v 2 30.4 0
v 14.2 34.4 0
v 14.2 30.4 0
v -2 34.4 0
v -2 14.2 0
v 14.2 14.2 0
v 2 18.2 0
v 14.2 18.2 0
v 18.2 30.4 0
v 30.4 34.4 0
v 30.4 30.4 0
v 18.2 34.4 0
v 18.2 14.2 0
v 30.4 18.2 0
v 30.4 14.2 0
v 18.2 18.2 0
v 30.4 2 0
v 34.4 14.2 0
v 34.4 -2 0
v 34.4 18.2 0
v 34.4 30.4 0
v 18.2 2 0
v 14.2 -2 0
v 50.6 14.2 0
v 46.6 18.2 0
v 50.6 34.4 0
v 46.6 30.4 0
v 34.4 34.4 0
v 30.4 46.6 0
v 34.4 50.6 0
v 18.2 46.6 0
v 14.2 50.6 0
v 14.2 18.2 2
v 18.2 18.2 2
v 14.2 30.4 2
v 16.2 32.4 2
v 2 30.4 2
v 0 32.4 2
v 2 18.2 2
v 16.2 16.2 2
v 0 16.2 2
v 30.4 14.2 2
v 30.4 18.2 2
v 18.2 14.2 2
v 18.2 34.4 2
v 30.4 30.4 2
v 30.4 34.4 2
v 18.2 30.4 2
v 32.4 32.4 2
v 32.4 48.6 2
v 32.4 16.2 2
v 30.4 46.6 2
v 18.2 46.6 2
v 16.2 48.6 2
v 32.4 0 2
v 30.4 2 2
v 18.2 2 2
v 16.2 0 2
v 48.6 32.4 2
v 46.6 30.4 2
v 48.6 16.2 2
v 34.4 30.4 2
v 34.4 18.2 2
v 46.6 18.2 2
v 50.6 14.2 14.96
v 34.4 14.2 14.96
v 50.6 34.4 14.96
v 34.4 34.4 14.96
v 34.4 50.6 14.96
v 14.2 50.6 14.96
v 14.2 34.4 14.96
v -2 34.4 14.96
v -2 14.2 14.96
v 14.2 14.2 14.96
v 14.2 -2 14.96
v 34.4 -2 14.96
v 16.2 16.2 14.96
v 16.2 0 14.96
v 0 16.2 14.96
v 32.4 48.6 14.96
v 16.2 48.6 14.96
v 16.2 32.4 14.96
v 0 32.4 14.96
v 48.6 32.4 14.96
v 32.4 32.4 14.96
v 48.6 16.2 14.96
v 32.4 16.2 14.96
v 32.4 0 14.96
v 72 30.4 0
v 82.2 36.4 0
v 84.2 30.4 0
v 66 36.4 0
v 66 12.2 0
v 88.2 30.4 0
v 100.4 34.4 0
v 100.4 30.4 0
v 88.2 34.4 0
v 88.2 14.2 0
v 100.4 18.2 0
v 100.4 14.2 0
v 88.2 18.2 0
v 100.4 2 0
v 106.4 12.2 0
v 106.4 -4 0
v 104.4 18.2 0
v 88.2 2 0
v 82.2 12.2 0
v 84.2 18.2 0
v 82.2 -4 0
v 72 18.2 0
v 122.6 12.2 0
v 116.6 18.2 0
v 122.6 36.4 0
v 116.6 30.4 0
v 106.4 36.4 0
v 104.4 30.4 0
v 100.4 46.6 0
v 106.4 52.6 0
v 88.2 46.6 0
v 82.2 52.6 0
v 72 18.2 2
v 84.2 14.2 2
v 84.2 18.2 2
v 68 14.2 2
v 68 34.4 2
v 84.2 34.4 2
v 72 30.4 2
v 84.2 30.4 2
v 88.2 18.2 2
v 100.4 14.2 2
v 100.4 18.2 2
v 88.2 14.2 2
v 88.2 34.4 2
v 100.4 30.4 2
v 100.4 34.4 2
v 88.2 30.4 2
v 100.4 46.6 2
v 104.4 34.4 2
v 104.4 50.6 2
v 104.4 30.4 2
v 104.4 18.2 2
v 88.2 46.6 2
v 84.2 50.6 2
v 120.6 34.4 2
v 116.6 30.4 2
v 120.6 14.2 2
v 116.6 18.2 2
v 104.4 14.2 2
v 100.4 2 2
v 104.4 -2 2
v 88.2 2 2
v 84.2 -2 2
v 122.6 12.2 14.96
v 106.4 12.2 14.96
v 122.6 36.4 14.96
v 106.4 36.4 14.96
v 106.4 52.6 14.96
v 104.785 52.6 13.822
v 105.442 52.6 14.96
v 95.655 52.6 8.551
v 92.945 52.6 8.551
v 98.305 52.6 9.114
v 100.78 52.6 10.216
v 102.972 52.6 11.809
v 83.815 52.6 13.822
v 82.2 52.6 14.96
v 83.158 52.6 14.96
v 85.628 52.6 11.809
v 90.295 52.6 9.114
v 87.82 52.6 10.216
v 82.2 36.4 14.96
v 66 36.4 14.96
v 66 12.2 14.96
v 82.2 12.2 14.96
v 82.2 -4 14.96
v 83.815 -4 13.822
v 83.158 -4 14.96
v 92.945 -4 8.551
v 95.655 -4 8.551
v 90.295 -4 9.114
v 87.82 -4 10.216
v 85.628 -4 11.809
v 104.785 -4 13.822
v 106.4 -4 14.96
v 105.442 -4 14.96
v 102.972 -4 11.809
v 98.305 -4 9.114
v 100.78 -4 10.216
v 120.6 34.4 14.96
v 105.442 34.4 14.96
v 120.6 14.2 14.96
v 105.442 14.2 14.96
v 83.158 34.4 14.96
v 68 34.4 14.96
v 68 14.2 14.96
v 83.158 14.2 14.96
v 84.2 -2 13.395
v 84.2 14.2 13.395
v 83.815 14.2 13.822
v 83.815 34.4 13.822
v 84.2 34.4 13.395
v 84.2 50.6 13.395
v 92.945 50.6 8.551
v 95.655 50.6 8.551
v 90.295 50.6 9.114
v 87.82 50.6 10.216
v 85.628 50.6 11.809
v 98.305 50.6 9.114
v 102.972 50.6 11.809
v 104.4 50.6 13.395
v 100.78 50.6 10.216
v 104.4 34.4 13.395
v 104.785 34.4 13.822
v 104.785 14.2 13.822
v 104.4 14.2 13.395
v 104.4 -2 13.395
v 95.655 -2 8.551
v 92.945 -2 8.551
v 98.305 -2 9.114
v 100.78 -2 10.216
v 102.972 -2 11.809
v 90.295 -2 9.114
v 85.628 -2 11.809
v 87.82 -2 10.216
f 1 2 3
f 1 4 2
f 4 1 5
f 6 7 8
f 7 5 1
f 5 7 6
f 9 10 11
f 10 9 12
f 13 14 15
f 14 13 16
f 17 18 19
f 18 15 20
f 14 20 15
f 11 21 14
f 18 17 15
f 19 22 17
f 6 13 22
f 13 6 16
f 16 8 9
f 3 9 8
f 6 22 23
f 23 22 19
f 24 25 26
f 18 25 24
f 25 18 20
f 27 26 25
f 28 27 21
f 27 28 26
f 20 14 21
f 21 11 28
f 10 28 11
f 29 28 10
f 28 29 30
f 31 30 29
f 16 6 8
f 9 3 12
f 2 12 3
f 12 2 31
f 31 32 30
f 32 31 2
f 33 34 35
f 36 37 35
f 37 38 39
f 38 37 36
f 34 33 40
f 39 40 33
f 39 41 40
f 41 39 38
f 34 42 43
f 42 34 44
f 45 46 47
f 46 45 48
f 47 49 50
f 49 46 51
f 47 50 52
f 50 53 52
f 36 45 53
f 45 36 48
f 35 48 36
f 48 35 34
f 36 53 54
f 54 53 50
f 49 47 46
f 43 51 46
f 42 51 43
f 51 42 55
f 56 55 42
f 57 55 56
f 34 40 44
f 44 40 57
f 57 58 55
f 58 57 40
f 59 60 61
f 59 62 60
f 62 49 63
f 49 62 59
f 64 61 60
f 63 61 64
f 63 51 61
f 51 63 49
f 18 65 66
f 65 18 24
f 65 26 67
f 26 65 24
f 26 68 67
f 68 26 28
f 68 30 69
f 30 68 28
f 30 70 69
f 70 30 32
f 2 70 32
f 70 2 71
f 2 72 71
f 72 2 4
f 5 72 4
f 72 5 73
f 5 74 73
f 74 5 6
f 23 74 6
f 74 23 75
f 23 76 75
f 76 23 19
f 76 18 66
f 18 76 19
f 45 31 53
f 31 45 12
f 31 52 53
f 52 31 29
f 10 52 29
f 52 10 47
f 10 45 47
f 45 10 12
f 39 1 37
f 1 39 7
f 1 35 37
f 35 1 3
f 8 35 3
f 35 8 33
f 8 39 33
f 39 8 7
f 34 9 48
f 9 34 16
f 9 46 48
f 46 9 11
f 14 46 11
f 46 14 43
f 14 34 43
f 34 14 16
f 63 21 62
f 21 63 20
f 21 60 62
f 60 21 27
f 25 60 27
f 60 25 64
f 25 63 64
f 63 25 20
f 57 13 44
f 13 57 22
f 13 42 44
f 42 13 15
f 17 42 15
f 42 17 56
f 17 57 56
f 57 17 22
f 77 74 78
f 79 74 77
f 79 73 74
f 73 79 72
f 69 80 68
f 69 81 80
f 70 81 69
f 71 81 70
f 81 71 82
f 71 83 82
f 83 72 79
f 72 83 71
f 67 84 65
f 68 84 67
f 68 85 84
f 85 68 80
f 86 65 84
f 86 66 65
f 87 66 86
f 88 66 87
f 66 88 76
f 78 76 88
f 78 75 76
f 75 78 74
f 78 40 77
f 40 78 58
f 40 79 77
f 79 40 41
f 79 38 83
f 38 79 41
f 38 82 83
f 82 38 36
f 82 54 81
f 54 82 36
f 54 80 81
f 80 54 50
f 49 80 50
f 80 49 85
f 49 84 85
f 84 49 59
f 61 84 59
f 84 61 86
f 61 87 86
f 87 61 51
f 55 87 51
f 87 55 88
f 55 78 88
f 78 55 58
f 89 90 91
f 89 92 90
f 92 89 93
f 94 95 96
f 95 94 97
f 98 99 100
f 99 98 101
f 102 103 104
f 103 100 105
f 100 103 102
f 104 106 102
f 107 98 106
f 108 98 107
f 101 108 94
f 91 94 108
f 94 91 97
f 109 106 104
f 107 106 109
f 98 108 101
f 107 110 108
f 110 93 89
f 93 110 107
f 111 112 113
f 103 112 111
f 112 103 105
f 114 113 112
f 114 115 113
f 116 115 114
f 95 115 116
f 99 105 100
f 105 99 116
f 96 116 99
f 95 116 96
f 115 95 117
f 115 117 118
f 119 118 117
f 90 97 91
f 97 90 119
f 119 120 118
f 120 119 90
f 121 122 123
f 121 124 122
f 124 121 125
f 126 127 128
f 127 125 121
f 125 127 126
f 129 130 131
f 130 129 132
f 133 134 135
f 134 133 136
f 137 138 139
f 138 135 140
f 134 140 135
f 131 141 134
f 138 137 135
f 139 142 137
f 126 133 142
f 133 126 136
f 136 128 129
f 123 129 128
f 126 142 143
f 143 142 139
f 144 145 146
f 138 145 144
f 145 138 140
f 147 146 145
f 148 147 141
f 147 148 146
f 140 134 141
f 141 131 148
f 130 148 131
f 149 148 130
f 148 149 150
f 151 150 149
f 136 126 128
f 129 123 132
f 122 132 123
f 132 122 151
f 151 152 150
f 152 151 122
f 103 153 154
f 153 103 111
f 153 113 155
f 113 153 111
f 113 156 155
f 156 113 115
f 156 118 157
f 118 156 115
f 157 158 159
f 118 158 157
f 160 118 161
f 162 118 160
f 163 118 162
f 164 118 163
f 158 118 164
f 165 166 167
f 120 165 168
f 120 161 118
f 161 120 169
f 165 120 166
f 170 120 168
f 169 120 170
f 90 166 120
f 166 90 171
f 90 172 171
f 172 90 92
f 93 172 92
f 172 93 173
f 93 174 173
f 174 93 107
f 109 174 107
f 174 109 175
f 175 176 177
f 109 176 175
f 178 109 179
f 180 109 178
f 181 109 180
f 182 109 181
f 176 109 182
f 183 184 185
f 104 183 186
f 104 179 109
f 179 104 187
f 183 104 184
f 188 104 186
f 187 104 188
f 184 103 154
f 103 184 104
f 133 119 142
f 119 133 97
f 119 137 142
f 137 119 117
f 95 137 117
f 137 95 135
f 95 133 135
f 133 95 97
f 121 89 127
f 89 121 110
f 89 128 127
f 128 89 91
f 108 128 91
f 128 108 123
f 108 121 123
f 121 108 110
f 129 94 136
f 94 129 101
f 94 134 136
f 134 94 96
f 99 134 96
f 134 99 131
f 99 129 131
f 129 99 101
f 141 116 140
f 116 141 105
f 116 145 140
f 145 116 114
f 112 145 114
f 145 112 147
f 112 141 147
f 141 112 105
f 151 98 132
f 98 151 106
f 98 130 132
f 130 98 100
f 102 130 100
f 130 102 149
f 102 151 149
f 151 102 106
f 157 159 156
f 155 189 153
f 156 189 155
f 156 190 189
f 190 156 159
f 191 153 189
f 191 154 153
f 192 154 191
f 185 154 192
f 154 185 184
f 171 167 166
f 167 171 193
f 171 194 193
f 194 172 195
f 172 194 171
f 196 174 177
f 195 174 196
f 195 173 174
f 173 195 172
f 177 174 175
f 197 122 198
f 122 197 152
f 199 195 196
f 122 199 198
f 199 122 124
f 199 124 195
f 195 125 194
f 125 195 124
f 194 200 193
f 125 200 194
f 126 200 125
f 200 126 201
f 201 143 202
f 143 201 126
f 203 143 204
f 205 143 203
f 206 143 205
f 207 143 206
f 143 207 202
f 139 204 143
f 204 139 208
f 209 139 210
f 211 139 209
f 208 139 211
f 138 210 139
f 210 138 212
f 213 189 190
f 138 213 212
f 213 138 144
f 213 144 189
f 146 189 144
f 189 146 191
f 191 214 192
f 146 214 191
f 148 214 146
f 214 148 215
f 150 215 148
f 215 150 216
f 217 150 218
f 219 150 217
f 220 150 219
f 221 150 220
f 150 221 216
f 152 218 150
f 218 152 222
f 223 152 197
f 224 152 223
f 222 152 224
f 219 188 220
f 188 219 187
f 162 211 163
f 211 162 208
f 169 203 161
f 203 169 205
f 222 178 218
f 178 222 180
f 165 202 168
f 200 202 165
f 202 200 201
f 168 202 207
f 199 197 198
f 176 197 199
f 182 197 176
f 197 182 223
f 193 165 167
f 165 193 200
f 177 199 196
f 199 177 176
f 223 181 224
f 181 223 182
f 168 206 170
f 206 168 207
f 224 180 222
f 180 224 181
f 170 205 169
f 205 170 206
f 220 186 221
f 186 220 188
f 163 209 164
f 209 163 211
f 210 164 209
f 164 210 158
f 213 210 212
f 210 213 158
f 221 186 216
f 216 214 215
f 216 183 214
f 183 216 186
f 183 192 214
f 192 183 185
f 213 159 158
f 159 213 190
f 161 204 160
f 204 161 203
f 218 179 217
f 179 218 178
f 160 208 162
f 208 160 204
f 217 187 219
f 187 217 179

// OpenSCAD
// file: diceware.scad
mm = 1;

die_width = 16.2 * mm;
wall_width = 2 * mm;
wall_height = 0.8 * die_width;
window_border = 2 * mm;

module clamshell()
{
    linear_extrude(wall_width) difference()
    {
        offset(delta = wall_width) children(0);
        if ($children > 1)
        {
            children(1);
        }
    }

    translate([ 0, 0, wall_width ]) linear_extrude(wall_height) difference()
    {
        offset(delta = wall_width) children(0);
        children(0);
    }
}

module window()
{
    offset(delta = -window_border) scale(die_width) polygon([ [ 0, 0 ], [ 1, 0 ], [ 1, 1 ], [ 0, 1 ] ]);
}

module diceware_bottom()
{
    clamshell()
    {
        // Base
        children(0);
        // Base Cutouts
        children(1);
    }
}

module diceware_top()
{
    difference()
    {
        clamshell()
        {
            // Base
            offset(delta = wall_width) children(0);

            // Base Cutouts
            children(1);
        }
        // Wall Cutouts
        children(2);
    }
}
// main file
include <diceware.scad>

module plus_base()
{
    scale([ die_width, die_width ]) polygon([
        [ 1, 1 ],
        [ 1, 0 ],
        [ 2, 0 ],
        [ 2, 1 ],
        [ 3, 1 ],
        [ 3, 2 ],
        [ 2, 2 ],
        [ 2, 3 ],
        [ 1, 3 ],
        [ 1, 2 ],
        [ 0, 2 ],
        [ 0, 1 ],
    ]);
}

module plus_windows()
{
    for (x = [ [ 1, 0 ], [ 0, 1 ], [ 1, 1 ], [ 1, 2 ], [ 2, 1 ] ])
    {
        translate(die_width * x) window();
    }
}

module plus_bottom()
{
    diceware_bottom()
    {
        plus_base();
        plus_windows();
    }
}

module plus_top()
{
    diceware_top()
    {
        plus_base();
        plus_windows();
        translate([ 1.5 * die_width, -2 * wall_width - 0.1 * mm, wall_width + wall_height * 1.5 ]) rotate([ -90, 0, 0 ])
            cylinder(r = wall_height, h = 3 * die_width + 4 * wall_width + 0.2 * mm);
    }
}

plus_bottom();
translate([ 70, 0, 0 ]) plus_top();
